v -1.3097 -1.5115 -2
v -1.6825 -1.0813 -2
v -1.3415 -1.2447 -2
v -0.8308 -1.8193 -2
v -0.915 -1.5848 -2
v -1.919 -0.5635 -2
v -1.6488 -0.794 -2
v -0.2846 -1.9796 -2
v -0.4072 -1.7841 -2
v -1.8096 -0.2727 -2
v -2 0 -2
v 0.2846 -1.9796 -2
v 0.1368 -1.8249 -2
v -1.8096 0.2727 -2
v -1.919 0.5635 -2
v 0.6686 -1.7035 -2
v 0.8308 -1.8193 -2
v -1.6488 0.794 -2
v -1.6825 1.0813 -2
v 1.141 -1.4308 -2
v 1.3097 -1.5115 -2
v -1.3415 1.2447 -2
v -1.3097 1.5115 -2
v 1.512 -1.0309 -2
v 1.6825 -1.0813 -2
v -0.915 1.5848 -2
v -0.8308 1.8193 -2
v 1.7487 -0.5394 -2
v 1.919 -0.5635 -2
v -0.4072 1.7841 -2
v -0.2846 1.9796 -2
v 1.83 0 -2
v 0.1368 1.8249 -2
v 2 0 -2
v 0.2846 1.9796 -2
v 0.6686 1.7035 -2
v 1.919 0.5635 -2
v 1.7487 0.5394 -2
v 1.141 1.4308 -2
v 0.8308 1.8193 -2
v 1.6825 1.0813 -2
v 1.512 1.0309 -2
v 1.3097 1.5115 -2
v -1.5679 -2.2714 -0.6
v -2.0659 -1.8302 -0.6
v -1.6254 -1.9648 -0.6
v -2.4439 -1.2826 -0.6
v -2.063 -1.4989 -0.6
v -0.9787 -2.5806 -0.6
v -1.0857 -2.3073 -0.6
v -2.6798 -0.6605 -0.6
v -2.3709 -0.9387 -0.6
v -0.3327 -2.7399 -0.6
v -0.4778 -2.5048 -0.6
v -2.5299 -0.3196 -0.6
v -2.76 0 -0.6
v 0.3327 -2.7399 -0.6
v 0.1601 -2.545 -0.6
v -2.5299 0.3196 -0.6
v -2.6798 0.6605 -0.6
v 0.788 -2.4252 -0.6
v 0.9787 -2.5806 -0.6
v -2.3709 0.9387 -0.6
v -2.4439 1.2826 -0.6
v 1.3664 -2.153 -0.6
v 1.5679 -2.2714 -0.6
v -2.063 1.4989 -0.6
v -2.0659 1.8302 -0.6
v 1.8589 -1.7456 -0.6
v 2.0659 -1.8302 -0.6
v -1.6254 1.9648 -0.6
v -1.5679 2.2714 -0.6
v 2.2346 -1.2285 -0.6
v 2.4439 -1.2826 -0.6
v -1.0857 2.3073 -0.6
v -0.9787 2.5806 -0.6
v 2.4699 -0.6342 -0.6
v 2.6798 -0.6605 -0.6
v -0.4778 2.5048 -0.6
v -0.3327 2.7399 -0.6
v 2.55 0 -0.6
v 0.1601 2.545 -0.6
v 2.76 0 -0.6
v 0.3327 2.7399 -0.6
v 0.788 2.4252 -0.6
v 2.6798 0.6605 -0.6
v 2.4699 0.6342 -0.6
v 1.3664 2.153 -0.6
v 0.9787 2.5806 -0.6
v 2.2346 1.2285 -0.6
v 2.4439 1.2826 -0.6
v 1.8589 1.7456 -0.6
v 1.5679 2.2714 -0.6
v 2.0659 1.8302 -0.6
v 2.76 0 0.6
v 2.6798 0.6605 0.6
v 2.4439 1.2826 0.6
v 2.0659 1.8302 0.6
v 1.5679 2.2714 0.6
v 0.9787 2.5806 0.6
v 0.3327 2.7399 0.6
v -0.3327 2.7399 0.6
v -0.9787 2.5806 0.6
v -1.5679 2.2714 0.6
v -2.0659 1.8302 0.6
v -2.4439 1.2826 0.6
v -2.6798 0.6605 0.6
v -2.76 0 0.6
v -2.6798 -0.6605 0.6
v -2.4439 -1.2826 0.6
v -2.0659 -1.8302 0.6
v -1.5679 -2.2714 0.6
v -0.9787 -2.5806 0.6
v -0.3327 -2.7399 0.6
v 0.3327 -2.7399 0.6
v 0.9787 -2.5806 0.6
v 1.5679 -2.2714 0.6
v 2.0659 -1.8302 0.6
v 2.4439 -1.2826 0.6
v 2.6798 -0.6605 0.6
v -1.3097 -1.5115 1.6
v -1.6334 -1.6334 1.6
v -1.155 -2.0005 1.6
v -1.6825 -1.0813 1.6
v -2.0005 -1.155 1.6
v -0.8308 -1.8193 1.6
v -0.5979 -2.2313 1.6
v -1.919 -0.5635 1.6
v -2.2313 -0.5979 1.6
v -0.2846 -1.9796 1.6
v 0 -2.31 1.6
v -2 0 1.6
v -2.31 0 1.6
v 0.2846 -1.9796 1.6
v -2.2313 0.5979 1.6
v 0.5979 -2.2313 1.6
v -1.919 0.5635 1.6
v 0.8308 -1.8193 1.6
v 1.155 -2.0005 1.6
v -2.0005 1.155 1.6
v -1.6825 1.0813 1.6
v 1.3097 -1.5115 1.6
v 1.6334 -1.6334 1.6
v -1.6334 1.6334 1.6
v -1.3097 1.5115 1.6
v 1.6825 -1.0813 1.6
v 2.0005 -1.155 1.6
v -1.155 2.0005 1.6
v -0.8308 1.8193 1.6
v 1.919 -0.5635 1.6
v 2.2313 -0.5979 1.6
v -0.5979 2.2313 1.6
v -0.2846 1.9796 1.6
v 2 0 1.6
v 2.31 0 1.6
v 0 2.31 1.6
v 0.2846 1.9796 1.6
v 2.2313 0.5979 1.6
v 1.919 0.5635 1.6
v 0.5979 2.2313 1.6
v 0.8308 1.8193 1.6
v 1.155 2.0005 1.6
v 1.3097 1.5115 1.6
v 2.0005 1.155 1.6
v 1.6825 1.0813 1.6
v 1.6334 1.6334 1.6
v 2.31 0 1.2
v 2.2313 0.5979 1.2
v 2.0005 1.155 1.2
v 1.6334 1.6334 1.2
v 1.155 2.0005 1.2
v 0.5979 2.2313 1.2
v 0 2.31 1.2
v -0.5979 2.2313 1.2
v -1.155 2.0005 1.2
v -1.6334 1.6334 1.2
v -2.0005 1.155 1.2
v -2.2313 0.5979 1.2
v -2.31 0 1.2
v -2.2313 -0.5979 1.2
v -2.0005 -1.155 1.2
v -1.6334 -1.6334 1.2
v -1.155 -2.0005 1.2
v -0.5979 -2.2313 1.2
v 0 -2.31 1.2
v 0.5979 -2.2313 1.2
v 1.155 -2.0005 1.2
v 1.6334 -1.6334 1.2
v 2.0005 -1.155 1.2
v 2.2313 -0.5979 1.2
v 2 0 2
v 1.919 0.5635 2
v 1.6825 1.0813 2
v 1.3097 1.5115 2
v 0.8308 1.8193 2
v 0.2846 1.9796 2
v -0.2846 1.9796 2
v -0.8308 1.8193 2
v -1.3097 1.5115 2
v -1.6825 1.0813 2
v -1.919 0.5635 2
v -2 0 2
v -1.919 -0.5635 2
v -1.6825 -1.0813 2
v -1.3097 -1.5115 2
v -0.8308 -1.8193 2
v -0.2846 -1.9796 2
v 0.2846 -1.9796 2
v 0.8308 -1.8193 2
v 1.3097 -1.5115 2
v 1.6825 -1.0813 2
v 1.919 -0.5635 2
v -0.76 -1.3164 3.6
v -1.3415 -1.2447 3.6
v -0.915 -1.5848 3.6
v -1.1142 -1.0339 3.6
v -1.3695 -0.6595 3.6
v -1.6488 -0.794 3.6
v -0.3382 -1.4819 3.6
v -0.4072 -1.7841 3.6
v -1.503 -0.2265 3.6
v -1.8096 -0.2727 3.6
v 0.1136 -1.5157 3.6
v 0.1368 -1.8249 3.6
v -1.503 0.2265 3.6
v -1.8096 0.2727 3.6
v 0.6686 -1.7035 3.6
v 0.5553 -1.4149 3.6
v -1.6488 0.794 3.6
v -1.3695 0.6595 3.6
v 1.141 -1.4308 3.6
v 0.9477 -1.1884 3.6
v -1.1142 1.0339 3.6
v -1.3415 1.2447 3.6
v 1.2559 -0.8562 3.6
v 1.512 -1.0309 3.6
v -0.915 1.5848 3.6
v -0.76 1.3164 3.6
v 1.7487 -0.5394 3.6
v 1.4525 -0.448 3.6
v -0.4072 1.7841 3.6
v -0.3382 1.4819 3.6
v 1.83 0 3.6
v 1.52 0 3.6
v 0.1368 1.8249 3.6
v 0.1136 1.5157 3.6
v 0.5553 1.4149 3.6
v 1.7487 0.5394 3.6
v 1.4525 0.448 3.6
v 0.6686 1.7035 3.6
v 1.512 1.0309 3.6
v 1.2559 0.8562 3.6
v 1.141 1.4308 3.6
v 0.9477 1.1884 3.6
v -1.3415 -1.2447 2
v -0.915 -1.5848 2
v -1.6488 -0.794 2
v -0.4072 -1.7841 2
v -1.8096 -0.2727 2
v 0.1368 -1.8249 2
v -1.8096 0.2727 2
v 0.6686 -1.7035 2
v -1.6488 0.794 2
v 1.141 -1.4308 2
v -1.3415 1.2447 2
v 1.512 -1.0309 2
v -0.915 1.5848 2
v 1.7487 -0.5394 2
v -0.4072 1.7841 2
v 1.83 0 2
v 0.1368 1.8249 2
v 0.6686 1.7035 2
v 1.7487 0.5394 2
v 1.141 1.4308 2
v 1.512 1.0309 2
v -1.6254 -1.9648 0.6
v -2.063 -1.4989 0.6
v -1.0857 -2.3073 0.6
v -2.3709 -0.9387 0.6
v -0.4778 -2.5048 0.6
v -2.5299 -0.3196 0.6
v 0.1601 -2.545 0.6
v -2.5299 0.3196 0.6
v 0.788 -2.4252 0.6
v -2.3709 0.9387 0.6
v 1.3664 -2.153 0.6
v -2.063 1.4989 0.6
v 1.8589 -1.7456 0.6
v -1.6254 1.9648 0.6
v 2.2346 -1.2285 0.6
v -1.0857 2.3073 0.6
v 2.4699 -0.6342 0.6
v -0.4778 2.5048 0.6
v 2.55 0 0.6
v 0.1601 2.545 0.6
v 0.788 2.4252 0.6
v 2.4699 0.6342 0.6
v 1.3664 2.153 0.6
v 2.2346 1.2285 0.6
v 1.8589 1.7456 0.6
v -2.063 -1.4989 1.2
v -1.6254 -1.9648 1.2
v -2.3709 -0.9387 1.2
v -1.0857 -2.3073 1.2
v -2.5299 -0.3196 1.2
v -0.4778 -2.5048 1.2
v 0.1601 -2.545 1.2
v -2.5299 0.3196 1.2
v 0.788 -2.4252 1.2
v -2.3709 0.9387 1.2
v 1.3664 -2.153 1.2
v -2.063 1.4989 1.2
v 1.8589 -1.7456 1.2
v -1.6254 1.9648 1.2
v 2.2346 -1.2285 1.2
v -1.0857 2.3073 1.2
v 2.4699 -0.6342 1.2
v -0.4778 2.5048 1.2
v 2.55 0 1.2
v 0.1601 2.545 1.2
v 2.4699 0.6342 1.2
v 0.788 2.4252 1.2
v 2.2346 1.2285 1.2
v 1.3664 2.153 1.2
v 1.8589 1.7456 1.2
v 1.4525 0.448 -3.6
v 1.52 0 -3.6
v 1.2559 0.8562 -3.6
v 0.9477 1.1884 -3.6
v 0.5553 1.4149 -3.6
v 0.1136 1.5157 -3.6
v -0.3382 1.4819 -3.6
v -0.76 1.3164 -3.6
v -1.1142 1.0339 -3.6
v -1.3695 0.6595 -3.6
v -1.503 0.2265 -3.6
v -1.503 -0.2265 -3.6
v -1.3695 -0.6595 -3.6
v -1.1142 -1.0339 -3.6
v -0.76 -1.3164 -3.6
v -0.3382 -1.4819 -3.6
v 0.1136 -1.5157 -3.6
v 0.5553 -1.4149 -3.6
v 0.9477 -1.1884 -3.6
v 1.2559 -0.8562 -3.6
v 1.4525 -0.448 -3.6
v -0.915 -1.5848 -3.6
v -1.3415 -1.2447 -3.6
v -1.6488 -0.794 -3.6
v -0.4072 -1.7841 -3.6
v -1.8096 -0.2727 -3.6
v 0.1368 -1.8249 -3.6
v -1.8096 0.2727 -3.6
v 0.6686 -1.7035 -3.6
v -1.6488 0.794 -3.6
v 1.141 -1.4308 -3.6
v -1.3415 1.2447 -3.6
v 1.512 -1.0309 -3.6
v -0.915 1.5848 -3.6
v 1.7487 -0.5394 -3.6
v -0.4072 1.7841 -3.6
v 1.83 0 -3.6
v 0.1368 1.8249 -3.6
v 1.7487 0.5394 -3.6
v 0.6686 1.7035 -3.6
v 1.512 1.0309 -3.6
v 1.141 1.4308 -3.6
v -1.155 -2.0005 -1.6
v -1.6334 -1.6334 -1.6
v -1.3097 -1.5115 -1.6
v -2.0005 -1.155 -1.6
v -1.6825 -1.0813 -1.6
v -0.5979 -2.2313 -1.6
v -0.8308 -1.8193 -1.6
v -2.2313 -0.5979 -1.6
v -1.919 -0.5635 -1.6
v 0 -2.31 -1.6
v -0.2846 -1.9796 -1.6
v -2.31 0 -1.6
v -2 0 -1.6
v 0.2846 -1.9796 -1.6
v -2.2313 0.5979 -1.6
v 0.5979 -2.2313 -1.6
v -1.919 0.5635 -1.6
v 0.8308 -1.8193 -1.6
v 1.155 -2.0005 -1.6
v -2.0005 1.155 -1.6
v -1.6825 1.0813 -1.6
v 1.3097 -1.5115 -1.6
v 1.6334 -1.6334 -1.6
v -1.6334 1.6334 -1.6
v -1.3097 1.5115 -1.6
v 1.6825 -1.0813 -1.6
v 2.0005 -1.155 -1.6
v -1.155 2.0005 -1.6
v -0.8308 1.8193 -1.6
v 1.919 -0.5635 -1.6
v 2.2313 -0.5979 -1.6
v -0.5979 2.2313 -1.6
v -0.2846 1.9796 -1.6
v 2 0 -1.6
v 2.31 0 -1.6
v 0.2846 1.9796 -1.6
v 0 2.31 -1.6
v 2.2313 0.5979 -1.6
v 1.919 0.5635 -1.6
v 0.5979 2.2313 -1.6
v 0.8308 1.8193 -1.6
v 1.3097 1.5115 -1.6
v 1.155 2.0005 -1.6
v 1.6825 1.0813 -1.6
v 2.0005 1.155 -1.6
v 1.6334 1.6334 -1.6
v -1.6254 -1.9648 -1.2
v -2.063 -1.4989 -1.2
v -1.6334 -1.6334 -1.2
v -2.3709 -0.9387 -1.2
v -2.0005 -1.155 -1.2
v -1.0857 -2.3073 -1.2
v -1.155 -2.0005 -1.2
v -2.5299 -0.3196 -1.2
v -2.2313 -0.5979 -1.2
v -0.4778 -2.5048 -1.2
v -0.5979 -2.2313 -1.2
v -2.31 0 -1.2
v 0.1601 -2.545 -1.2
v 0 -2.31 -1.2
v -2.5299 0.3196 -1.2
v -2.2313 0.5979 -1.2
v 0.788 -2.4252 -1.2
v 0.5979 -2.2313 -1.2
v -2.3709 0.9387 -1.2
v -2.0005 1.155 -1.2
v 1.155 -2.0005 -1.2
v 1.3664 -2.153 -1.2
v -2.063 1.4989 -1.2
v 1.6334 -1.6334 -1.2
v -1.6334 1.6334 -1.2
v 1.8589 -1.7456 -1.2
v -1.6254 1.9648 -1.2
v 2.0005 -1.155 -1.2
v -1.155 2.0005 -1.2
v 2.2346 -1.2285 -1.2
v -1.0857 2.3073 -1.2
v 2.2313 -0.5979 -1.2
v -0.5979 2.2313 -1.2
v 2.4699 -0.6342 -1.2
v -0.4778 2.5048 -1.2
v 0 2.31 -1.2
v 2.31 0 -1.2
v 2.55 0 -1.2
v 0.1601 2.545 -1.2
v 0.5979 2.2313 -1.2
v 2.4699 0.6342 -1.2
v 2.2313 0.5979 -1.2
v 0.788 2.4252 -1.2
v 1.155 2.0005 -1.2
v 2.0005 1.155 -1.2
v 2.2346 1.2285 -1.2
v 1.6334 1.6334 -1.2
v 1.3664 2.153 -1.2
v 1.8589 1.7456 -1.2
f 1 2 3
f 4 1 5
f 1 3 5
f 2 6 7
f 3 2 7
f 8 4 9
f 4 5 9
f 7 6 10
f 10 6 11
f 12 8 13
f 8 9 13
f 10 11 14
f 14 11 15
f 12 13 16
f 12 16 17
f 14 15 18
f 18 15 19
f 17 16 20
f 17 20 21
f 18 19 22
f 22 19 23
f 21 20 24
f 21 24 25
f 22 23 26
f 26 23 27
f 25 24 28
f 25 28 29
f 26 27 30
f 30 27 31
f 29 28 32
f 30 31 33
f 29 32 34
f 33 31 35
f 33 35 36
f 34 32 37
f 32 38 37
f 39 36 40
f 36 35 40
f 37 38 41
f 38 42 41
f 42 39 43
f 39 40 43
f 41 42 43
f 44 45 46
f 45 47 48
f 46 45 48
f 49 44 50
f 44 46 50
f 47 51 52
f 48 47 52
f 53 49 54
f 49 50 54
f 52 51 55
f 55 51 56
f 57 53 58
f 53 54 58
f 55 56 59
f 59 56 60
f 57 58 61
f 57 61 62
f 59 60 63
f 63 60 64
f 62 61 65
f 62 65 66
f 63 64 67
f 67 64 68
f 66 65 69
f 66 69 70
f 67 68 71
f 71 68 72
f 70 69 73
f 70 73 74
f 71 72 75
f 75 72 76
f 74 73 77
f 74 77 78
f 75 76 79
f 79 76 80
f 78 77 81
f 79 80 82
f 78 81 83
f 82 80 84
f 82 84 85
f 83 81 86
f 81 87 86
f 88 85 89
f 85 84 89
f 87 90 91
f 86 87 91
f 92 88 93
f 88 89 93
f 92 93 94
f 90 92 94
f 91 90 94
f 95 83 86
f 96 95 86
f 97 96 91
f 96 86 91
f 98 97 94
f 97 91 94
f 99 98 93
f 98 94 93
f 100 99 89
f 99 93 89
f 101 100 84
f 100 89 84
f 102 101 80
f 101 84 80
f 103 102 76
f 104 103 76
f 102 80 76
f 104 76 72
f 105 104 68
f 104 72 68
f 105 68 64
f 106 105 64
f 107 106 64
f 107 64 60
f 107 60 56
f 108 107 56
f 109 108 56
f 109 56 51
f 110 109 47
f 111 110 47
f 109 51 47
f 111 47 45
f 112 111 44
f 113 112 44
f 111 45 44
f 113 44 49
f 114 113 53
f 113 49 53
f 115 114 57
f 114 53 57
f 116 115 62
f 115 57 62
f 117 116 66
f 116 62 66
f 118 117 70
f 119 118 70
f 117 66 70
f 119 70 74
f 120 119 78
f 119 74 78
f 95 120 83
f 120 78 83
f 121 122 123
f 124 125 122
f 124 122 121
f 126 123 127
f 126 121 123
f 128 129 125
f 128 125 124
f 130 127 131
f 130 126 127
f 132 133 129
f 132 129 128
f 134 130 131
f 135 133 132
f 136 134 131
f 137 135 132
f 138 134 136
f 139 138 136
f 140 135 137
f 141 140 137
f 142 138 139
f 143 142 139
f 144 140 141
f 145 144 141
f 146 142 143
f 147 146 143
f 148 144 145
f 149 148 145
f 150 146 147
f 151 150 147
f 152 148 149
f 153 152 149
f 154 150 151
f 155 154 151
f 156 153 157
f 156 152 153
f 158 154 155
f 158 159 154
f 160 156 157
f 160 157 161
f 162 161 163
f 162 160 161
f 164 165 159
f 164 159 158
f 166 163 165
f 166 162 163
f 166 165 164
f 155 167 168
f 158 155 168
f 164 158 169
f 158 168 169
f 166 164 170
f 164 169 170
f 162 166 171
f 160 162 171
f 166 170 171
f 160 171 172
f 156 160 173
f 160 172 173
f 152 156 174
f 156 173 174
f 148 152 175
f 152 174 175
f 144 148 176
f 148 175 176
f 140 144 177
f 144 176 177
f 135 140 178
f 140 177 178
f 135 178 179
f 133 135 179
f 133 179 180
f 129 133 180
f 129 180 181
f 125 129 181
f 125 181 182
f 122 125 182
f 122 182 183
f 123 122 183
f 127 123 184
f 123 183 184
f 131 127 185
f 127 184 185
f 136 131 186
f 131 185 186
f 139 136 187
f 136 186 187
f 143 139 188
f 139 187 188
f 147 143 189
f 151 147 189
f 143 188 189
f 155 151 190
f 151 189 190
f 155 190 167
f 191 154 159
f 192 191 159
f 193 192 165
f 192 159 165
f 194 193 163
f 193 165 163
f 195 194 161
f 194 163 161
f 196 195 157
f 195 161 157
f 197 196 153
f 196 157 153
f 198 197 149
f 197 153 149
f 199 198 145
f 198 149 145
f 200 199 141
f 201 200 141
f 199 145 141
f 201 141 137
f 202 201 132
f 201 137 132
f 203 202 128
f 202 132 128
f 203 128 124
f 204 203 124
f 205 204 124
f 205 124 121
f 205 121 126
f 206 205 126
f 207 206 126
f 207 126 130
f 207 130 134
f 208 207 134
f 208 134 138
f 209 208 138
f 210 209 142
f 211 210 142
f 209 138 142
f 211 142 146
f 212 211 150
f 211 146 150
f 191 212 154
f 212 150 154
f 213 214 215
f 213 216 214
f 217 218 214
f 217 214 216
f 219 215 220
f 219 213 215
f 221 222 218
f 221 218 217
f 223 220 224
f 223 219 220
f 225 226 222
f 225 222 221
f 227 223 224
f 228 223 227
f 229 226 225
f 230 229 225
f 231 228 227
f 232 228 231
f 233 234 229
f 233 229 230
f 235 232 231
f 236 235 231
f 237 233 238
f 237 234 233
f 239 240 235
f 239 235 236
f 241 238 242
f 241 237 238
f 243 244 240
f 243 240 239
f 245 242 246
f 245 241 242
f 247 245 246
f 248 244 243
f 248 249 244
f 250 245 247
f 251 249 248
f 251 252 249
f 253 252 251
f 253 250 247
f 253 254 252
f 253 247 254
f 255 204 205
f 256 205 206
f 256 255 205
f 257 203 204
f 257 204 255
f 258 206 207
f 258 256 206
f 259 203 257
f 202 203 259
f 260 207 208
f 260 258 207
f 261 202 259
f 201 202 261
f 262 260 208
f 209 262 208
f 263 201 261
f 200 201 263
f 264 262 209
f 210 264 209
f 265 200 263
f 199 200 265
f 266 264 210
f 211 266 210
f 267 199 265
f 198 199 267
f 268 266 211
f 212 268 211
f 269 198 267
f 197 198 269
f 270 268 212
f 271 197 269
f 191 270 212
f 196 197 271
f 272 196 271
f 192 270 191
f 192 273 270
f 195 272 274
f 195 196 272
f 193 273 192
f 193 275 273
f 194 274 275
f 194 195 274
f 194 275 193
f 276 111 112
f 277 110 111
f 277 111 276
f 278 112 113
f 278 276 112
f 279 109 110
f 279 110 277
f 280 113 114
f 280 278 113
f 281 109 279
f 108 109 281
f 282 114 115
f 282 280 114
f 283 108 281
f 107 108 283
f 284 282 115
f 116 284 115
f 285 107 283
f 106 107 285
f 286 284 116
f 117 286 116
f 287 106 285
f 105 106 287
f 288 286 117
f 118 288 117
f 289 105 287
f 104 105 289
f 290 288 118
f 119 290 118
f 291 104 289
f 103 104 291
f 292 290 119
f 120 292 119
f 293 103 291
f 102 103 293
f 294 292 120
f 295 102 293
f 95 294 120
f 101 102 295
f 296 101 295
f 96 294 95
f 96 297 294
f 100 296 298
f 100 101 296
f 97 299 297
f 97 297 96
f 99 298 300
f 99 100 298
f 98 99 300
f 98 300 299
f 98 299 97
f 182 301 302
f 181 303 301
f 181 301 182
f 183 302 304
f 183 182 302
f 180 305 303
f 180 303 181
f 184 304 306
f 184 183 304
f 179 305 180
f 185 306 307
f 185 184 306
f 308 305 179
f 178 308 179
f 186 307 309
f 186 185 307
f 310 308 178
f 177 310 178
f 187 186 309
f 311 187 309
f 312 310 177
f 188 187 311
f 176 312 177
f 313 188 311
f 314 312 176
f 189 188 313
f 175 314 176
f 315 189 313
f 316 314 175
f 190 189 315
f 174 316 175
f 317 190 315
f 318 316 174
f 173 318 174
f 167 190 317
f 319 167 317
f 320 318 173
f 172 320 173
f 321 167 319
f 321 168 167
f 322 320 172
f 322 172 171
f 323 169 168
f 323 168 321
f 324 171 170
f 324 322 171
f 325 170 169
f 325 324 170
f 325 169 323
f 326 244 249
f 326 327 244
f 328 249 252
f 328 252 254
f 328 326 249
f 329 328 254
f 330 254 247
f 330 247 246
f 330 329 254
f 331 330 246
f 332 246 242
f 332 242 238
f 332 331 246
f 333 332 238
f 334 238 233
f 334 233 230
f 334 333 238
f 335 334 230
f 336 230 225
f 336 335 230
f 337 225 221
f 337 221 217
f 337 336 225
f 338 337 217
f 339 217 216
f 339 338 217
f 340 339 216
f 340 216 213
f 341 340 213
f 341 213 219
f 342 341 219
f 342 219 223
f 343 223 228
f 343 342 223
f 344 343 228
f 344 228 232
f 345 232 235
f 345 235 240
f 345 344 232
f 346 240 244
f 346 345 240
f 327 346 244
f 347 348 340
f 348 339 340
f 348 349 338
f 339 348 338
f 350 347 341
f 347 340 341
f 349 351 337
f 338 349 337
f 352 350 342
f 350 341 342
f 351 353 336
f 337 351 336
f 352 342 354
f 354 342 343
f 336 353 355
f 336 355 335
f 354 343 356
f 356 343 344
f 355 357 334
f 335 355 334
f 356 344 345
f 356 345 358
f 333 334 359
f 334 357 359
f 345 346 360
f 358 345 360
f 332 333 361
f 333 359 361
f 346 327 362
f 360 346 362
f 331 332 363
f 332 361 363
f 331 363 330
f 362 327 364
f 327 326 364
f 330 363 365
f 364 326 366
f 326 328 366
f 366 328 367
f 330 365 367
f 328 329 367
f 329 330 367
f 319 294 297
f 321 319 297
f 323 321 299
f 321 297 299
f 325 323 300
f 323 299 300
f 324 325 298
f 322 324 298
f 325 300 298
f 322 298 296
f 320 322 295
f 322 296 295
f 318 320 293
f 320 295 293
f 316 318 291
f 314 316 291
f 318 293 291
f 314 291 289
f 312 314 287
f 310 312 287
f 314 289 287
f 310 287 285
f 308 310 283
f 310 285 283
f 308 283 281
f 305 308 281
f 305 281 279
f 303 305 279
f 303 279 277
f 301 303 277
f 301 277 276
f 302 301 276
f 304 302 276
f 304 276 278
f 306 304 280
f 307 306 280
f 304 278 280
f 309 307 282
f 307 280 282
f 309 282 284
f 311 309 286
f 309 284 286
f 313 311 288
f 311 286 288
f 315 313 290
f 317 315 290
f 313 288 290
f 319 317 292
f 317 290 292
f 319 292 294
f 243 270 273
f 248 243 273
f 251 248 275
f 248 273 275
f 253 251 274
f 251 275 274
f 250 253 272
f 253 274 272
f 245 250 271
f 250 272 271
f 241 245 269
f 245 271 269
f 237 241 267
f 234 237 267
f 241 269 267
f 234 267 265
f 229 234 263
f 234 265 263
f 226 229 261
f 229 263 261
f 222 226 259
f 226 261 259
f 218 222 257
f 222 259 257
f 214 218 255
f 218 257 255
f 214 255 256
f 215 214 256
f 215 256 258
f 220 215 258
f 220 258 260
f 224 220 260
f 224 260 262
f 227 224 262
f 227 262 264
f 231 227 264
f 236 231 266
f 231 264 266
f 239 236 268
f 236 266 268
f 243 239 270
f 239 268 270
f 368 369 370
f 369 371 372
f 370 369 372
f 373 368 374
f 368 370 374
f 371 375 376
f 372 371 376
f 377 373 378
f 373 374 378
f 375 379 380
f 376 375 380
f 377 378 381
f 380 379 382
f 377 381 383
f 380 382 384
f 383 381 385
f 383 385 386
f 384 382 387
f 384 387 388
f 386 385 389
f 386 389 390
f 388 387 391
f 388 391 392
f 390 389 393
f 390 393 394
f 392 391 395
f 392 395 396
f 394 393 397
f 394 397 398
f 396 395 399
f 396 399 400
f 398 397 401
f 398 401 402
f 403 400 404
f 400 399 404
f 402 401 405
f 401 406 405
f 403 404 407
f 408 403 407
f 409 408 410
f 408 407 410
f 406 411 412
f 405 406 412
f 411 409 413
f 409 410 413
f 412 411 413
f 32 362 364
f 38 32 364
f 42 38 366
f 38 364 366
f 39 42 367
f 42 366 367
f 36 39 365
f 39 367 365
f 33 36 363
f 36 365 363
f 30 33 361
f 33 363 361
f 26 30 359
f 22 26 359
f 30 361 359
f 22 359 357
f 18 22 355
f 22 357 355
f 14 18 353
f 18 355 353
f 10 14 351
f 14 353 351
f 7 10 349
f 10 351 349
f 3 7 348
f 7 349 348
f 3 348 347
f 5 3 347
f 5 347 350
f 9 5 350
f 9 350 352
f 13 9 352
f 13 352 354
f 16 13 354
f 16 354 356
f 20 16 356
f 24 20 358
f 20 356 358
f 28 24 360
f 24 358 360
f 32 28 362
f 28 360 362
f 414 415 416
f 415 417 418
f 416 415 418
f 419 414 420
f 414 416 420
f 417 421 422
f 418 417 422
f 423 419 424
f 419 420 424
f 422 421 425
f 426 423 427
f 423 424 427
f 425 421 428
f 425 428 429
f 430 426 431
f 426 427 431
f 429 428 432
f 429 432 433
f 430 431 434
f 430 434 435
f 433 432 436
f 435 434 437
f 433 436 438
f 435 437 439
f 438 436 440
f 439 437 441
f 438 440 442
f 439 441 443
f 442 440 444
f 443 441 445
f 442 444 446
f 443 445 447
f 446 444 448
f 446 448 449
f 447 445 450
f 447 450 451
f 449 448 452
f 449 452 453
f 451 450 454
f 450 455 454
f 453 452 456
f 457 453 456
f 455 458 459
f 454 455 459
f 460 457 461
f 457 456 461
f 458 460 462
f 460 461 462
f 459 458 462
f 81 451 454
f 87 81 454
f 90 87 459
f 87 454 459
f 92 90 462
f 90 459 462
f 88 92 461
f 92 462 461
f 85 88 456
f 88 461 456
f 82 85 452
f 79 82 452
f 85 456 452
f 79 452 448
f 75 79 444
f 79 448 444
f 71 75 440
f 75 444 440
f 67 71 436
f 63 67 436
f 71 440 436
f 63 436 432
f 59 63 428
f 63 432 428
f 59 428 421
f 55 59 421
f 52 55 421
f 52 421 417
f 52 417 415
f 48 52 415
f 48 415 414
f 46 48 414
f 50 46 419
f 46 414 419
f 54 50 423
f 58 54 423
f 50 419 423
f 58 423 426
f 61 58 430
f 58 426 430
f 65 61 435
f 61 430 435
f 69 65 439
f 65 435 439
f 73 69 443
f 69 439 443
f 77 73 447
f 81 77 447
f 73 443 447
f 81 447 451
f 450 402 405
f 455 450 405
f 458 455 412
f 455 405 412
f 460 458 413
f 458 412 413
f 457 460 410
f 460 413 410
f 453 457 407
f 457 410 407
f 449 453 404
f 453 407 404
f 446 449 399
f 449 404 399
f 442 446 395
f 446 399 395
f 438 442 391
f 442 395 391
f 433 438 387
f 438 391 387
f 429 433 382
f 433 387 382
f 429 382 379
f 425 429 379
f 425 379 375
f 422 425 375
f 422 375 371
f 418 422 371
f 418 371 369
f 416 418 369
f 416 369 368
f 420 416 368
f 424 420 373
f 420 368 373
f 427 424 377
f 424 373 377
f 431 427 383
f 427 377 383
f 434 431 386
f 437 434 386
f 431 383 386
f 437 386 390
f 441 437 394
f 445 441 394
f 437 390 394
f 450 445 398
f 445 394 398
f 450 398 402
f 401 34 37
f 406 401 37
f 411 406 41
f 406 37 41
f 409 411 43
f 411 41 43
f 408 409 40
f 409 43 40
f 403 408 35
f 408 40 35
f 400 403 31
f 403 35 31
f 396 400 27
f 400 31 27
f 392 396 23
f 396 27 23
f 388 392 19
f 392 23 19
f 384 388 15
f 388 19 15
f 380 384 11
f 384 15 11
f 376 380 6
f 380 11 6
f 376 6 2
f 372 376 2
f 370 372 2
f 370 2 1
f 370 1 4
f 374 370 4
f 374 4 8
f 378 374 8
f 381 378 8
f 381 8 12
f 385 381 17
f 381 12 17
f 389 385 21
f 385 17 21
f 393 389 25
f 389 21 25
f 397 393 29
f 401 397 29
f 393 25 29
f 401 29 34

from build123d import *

# Parameters (mm, degrees)
F_01_START                                     = -3.6
S01_BALL_AND_MISALIGNMENT_SPACER_LAND_R        = 1.83
S01_BALL_AND_MISALIGNMENT_SPACER_LAND_R_2      = 1.52
F_01_BALL_AND_MISALIGNMENT_SPACER_LAND_1_DEPTH = 1.6
F_02_START                                     = -2
S02_BALL_AND_MISALIGNMENT_SPACER_LAND_R        = 2
S02_BALL_AND_MISALIGNMENT_SPACER_LAND_R_2      = 1.52
F_02_BALL_AND_MISALIGNMENT_SPACER_LAND_2_DEPTH = 0.4
F_03_START                                     = -1.6
S03_BALL_AND_MISALIGNMENT_SPACER_LAND_R        = 2.31
S03_BALL_AND_MISALIGNMENT_SPACER_LAND_R_2      = 1.52
F_03_BALL_AND_MISALIGNMENT_SPACER_LAND_3_DEPTH = 0.4
F_04_START                                     = -1.2
S04_BALL_AND_MISALIGNMENT_SPACER_LAND_R        = 2.55
S04_BALL_AND_MISALIGNMENT_SPACER_LAND_R_2      = 1.52
F_04_BALL_AND_MISALIGNMENT_SPACER_LAND_4_DEPTH = 0.6
F_05_START                                     = -0.6
S05_BALL_AND_MISALIGNMENT_SPACER_LAND_R        = 2.76
S05_BALL_AND_MISALIGNMENT_SPACER_LAND_R_2      = 1.52
F_05_BALL_AND_MISALIGNMENT_SPACER_LAND_5_DEPTH = 1.2
F_06_START                                     = 0.6
S06_BALL_AND_MISALIGNMENT_SPACER_LAND_R        = 2.55
S06_BALL_AND_MISALIGNMENT_SPACER_LAND_R_2      = 1.52
F_06_BALL_AND_MISALIGNMENT_SPACER_LAND_6_DEPTH = 0.6
F_07_START                                     = 1.2
S07_BALL_AND_MISALIGNMENT_SPACER_LAND_R        = 2.31
S07_BALL_AND_MISALIGNMENT_SPACER_LAND_R_2      = 1.52
F_07_BALL_AND_MISALIGNMENT_SPACER_LAND_7_DEPTH = 0.4
F_08_START                                     = 1.6
S08_BALL_AND_MISALIGNMENT_SPACER_LAND_R        = 2
S08_BALL_AND_MISALIGNMENT_SPACER_LAND_R_2      = 1.52
F_08_BALL_AND_MISALIGNMENT_SPACER_LAND_8_DEPTH = 0.4
F_09_START                                     = 2
S09_BALL_AND_MISALIGNMENT_SPACER_LAND_R        = 1.83
S09_BALL_AND_MISALIGNMENT_SPACER_LAND_R_2      = 1.52
F_09_BALL_AND_MISALIGNMENT_SPACER_LAND_9_DEPTH = 1.6


with BuildPart() as part:
    # S01 - Ball and misalignment spacer land 1 → 01 - Ball and misalignment spacer land 1 (new body)
    with BuildSketch(Plane.XY.offset(F_01_START)):
        Circle(S01_BALL_AND_MISALIGNMENT_SPACER_LAND_R)
        Circle(S01_BALL_AND_MISALIGNMENT_SPACER_LAND_R_2, mode=Mode.SUBTRACT)
    extrude(amount=F_01_BALL_AND_MISALIGNMENT_SPACER_LAND_1_DEPTH)

    # S02 - Ball and misalignment spacer land 2 → 02 - Ball and misalignment spacer land 2 (add)
    with BuildSketch(Plane.XY.offset(F_02_START)):
        Circle(S02_BALL_AND_MISALIGNMENT_SPACER_LAND_R)
        Circle(S02_BALL_AND_MISALIGNMENT_SPACER_LAND_R_2, mode=Mode.SUBTRACT)
    extrude(amount=F_02_BALL_AND_MISALIGNMENT_SPACER_LAND_2_DEPTH)

    # S03 - Ball and misalignment spacer land 3 → 03 - Ball and misalignment spacer land 3 (add)
    with BuildSketch(Plane.XY.offset(F_03_START)):
        Circle(S03_BALL_AND_MISALIGNMENT_SPACER_LAND_R)
        Circle(S03_BALL_AND_MISALIGNMENT_SPACER_LAND_R_2, mode=Mode.SUBTRACT)
    extrude(amount=F_03_BALL_AND_MISALIGNMENT_SPACER_LAND_3_DEPTH)

    # S04 - Ball and misalignment spacer land 4 → 04 - Ball and misalignment spacer land 4 (add)
    with BuildSketch(Plane.XY.offset(F_04_START)):
        Circle(S04_BALL_AND_MISALIGNMENT_SPACER_LAND_R)
        Circle(S04_BALL_AND_MISALIGNMENT_SPACER_LAND_R_2, mode=Mode.SUBTRACT)
    extrude(amount=F_04_BALL_AND_MISALIGNMENT_SPACER_LAND_4_DEPTH)

    # S05 - Ball and misalignment spacer land 5 → 05 - Ball and misalignment spacer land 5 (add)
    with BuildSketch(Plane.XY.offset(F_05_START)):
        Circle(S05_BALL_AND_MISALIGNMENT_SPACER_LAND_R)
        Circle(S05_BALL_AND_MISALIGNMENT_SPACER_LAND_R_2, mode=Mode.SUBTRACT)
    extrude(amount=F_05_BALL_AND_MISALIGNMENT_SPACER_LAND_5_DEPTH)

    # S06 - Ball and misalignment spacer land 6 → 06 - Ball and misalignment spacer land 6 (add)
    with BuildSketch(Plane.XY.offset(F_06_START)):
        Circle(S06_BALL_AND_MISALIGNMENT_SPACER_LAND_R)
        Circle(S06_BALL_AND_MISALIGNMENT_SPACER_LAND_R_2, mode=Mode.SUBTRACT)
    extrude(amount=F_06_BALL_AND_MISALIGNMENT_SPACER_LAND_6_DEPTH)

    # S07 - Ball and misalignment spacer land 7 → 07 - Ball and misalignment spacer land 7 (add)
    with BuildSketch(Plane.XY.offset(F_07_START)):
        Circle(S07_BALL_AND_MISALIGNMENT_SPACER_LAND_R)
        Circle(S07_BALL_AND_MISALIGNMENT_SPACER_LAND_R_2, mode=Mode.SUBTRACT)
    extrude(amount=F_07_BALL_AND_MISALIGNMENT_SPACER_LAND_7_DEPTH)

    # S08 - Ball and misalignment spacer land 8 → 08 - Ball and misalignment spacer land 8 (add)
    with BuildSketch(Plane.XY.offset(F_08_START)):
        Circle(S08_BALL_AND_MISALIGNMENT_SPACER_LAND_R)
        Circle(S08_BALL_AND_MISALIGNMENT_SPACER_LAND_R_2, mode=Mode.SUBTRACT)
    extrude(amount=F_08_BALL_AND_MISALIGNMENT_SPACER_LAND_8_DEPTH)

    # S09 - Ball and misalignment spacer land 9 → 09 - Ball and misalignment spacer land 9 (add)
    with BuildSketch(Plane.XY.offset(F_09_START)):
        Circle(S09_BALL_AND_MISALIGNMENT_SPACER_LAND_R)
        Circle(S09_BALL_AND_MISALIGNMENT_SPACER_LAND_R_2, mode=Mode.SUBTRACT)
    extrude(amount=F_09_BALL_AND_MISALIGNMENT_SPACER_LAND_9_DEPTH)


solid = part.part
